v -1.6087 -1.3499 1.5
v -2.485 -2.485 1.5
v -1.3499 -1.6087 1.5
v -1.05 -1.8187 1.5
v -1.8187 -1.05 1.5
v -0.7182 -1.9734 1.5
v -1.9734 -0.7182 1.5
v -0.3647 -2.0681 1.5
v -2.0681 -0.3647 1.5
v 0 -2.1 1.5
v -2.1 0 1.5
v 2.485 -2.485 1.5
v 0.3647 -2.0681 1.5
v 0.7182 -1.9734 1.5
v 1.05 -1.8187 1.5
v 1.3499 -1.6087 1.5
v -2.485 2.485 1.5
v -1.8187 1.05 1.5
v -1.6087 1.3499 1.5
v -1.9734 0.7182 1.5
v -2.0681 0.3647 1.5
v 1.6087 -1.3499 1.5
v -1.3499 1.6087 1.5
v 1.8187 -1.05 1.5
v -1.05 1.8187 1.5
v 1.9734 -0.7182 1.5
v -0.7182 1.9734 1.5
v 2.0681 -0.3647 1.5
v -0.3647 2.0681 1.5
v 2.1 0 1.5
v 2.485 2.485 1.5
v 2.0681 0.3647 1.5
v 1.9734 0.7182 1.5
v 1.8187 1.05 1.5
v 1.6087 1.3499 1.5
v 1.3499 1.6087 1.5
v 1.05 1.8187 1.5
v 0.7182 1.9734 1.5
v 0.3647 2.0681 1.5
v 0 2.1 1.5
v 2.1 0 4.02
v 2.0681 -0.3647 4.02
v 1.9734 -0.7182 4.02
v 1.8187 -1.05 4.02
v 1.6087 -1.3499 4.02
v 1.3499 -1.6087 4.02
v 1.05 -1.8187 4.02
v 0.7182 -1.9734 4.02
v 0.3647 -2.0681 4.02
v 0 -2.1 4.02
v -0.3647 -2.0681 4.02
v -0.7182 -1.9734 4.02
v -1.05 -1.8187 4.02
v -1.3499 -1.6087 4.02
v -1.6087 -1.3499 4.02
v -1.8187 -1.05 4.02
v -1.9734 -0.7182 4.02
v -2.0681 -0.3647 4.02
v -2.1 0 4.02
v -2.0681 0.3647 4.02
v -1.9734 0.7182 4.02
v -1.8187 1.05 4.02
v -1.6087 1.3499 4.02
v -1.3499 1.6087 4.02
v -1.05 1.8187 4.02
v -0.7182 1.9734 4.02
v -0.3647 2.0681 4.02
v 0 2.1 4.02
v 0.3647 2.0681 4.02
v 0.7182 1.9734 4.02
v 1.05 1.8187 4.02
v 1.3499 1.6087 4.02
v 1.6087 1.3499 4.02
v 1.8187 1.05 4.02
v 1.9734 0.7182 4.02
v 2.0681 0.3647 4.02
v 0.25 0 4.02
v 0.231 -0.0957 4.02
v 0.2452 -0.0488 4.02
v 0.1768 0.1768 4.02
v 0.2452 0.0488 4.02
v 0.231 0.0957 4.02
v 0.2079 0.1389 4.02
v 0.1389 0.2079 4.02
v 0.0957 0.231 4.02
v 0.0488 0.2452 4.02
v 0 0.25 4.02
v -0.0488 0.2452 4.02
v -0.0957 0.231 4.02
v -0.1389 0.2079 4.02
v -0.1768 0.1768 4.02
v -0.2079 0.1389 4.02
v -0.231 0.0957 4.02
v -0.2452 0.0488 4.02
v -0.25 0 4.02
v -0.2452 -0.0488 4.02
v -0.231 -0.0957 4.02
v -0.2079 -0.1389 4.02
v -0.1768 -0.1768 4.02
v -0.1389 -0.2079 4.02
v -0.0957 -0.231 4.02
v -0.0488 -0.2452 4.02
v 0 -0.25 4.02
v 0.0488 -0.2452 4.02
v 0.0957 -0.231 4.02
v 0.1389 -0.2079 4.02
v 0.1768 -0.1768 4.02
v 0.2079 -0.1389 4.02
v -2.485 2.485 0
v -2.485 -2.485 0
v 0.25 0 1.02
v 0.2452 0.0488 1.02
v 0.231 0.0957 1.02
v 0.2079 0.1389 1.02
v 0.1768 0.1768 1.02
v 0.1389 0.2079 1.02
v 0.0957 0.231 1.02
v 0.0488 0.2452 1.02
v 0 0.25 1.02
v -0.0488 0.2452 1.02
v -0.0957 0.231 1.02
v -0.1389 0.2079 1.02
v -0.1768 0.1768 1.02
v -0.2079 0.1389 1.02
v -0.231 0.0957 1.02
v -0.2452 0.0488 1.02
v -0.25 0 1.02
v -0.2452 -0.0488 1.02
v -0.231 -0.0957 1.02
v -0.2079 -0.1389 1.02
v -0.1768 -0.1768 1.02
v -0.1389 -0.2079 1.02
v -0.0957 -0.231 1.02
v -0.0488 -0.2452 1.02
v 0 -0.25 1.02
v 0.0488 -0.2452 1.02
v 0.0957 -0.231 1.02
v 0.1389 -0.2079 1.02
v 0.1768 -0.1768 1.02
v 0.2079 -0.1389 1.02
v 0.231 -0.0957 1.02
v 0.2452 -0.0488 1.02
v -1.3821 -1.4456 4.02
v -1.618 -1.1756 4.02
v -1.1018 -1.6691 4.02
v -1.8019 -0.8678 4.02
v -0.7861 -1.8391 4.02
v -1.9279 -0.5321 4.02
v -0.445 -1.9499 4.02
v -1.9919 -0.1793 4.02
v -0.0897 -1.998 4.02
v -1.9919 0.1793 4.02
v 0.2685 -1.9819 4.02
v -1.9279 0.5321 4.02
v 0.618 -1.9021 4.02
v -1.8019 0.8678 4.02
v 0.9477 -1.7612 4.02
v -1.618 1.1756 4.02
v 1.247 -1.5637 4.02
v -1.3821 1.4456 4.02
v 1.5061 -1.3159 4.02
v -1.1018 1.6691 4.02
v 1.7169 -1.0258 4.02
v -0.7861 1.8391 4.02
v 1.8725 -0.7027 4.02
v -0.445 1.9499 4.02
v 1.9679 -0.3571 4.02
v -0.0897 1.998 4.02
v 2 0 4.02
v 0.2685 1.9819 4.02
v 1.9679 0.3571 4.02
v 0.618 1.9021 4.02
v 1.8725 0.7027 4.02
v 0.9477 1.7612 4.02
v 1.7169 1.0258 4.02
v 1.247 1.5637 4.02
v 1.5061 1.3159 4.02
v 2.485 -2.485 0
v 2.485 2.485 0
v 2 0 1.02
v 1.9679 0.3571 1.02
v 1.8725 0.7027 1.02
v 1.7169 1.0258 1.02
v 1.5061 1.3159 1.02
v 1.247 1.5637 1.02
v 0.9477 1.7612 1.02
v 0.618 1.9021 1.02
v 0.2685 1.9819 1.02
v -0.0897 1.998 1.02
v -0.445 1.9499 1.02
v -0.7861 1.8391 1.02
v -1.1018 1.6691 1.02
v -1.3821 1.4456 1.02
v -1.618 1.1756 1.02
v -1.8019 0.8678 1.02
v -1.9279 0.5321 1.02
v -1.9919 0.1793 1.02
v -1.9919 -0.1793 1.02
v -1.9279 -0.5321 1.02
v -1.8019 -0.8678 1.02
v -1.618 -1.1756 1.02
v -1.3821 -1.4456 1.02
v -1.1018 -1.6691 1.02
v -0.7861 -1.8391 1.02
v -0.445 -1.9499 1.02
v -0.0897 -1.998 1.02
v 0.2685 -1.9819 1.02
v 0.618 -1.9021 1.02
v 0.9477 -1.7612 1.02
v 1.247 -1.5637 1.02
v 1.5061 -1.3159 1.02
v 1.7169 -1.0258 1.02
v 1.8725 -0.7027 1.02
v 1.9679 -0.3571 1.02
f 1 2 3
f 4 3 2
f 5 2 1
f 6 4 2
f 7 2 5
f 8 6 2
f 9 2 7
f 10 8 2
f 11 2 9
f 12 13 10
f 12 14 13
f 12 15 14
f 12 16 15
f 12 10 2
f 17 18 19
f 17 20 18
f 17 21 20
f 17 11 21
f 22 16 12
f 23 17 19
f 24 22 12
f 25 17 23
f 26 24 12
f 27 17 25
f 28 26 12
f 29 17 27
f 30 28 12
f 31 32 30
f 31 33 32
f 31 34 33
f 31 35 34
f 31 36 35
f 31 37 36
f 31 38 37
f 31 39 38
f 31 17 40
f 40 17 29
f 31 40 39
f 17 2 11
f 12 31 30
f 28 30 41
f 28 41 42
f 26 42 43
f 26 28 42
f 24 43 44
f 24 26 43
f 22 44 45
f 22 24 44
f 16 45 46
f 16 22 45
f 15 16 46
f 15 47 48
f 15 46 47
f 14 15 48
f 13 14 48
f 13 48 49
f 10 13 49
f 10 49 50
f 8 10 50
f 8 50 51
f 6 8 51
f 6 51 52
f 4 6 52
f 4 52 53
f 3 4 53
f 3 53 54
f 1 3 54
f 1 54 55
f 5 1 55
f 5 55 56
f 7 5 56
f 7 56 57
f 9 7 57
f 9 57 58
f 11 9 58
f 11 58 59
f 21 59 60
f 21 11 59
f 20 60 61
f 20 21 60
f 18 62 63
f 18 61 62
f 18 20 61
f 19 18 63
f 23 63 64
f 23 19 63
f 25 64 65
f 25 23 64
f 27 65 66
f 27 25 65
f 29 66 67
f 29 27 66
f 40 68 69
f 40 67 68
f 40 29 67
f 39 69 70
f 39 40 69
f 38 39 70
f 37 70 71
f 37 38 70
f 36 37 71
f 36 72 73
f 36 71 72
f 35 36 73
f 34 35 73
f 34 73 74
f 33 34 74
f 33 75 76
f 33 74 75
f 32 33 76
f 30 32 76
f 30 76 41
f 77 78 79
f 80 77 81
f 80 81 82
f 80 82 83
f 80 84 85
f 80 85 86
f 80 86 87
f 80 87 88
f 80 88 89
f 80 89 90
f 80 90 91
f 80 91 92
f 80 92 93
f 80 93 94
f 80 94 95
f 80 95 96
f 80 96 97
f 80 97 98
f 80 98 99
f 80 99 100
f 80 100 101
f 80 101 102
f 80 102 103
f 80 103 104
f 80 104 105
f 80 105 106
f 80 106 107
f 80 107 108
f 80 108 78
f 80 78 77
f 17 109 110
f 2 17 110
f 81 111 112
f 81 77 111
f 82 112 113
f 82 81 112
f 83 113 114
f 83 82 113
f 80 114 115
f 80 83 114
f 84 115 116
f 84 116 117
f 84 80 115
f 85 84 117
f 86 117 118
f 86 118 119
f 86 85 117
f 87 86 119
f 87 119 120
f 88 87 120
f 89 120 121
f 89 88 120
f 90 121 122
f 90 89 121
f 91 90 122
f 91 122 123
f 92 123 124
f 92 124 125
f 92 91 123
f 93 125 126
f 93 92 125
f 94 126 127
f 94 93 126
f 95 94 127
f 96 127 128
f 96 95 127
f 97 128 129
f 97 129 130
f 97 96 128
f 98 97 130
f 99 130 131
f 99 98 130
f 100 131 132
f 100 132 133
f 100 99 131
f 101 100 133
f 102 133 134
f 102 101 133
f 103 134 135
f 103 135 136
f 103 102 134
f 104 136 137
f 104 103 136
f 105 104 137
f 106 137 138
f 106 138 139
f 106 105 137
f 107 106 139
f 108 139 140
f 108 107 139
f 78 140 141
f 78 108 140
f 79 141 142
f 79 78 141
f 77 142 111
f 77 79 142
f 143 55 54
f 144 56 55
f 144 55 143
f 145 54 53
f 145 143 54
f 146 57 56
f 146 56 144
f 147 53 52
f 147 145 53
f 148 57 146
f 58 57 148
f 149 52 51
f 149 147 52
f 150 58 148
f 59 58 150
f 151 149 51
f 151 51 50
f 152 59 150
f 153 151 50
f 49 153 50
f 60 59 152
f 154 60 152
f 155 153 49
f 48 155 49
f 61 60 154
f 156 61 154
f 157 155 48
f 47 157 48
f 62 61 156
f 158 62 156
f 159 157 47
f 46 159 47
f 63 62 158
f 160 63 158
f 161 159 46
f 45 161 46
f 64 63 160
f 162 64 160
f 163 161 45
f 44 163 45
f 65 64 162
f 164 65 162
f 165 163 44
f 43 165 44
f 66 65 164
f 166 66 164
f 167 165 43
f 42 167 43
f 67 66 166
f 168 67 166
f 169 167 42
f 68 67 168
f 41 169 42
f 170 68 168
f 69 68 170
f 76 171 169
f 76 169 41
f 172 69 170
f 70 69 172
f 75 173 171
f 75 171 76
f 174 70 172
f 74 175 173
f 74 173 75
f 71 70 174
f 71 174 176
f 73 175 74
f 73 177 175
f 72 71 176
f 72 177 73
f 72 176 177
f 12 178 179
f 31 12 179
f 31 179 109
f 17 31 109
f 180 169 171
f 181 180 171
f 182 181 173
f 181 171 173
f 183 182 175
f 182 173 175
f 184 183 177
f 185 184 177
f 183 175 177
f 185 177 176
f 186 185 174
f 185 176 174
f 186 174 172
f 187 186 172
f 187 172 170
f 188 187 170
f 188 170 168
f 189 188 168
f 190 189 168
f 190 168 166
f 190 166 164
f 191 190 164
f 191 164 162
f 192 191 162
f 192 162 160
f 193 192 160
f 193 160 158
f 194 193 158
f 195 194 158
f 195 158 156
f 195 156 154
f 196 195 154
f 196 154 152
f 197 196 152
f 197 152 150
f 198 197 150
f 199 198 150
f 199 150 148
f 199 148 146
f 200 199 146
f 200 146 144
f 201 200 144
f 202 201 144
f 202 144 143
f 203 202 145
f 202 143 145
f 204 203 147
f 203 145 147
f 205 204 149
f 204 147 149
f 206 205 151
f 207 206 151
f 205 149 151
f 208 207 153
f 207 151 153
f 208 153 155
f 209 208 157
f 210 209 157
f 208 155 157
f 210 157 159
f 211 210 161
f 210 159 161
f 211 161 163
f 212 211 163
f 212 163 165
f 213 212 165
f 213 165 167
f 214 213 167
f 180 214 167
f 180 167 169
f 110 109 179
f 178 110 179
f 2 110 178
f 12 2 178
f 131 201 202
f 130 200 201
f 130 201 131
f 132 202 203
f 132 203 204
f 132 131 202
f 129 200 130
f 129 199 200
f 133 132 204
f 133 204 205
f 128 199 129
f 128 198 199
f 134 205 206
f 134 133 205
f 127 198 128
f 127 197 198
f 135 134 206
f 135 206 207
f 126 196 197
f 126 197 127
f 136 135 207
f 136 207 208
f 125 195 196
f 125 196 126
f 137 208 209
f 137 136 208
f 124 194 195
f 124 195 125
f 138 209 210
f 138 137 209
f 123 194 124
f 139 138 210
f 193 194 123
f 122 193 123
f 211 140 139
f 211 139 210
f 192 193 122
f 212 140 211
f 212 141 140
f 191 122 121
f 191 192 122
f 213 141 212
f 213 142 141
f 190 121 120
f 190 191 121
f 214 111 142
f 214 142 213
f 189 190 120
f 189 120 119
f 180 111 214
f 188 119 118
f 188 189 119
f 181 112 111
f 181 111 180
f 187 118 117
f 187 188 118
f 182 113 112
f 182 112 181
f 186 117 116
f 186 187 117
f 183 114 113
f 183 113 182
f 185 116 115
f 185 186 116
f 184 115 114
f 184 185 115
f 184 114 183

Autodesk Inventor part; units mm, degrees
ref_plane "YZ Plane" through (0, 0, 0) normal (1, 0, 0) x (0, 1, 0)
ref_plane "XZ Plane" through (0, 0, 0) normal (0, 1, 0) x (-1, 0, 0)
ref_plane "XY Plane" through (0, 0, 0) normal (0, 0, 1) x (1, 0, 0)
sketch "Sketch1" plane through (0, 0, 0) normal (0, 0, 1) x (1, 0, 0)
  line L0 (2.485, 2.485) -> (-2.485, 2.485)
  line L1 (-2.485, 2.485) -> (-2.485, -2.485)
  line L2 (-2.485, -2.485) -> (2.485, -2.485)
  line L3 (2.485, -2.485) -> (2.485, 2.485)
  line L4 (2.485, 2.485) -> (-2.485, -2.485) construction
  line L5 (-2.485, 2.485) -> (2.485, -2.485) construction
  point P0 (0, 0)
  dimension "d0" = 4.97
extrude "Extrusion1" add sketch "Sketch1" along normal blind 1.5
sketch "Sketch2" plane through (0, 0, 1.5) normal (0, 0, 1) x (1, 0, 0)
  circle A0 centre (0, 0) radius 2.1
  dimension "d3" = 4.2
extrude "Extrusion2" add sketch "Sketch2" along normal blind 2.52
sketch "Sketch3" plane through (0, 0, 4.02) normal (0, 0, 1) x (1, 0, 0)
  circle A0 centre (0, 0) radius 2.1 projected
  circle A1 centre (0, 0) radius 0.25
  circle A2 centre (0, 0) radius 2
  dimension "d6" = 0.5
  dimension "d7" = 4
extrude "Extrusion3" cut sketch "Sketch3" against normal blind 3 contours A2
properties part number "Connector" material "Gold"
